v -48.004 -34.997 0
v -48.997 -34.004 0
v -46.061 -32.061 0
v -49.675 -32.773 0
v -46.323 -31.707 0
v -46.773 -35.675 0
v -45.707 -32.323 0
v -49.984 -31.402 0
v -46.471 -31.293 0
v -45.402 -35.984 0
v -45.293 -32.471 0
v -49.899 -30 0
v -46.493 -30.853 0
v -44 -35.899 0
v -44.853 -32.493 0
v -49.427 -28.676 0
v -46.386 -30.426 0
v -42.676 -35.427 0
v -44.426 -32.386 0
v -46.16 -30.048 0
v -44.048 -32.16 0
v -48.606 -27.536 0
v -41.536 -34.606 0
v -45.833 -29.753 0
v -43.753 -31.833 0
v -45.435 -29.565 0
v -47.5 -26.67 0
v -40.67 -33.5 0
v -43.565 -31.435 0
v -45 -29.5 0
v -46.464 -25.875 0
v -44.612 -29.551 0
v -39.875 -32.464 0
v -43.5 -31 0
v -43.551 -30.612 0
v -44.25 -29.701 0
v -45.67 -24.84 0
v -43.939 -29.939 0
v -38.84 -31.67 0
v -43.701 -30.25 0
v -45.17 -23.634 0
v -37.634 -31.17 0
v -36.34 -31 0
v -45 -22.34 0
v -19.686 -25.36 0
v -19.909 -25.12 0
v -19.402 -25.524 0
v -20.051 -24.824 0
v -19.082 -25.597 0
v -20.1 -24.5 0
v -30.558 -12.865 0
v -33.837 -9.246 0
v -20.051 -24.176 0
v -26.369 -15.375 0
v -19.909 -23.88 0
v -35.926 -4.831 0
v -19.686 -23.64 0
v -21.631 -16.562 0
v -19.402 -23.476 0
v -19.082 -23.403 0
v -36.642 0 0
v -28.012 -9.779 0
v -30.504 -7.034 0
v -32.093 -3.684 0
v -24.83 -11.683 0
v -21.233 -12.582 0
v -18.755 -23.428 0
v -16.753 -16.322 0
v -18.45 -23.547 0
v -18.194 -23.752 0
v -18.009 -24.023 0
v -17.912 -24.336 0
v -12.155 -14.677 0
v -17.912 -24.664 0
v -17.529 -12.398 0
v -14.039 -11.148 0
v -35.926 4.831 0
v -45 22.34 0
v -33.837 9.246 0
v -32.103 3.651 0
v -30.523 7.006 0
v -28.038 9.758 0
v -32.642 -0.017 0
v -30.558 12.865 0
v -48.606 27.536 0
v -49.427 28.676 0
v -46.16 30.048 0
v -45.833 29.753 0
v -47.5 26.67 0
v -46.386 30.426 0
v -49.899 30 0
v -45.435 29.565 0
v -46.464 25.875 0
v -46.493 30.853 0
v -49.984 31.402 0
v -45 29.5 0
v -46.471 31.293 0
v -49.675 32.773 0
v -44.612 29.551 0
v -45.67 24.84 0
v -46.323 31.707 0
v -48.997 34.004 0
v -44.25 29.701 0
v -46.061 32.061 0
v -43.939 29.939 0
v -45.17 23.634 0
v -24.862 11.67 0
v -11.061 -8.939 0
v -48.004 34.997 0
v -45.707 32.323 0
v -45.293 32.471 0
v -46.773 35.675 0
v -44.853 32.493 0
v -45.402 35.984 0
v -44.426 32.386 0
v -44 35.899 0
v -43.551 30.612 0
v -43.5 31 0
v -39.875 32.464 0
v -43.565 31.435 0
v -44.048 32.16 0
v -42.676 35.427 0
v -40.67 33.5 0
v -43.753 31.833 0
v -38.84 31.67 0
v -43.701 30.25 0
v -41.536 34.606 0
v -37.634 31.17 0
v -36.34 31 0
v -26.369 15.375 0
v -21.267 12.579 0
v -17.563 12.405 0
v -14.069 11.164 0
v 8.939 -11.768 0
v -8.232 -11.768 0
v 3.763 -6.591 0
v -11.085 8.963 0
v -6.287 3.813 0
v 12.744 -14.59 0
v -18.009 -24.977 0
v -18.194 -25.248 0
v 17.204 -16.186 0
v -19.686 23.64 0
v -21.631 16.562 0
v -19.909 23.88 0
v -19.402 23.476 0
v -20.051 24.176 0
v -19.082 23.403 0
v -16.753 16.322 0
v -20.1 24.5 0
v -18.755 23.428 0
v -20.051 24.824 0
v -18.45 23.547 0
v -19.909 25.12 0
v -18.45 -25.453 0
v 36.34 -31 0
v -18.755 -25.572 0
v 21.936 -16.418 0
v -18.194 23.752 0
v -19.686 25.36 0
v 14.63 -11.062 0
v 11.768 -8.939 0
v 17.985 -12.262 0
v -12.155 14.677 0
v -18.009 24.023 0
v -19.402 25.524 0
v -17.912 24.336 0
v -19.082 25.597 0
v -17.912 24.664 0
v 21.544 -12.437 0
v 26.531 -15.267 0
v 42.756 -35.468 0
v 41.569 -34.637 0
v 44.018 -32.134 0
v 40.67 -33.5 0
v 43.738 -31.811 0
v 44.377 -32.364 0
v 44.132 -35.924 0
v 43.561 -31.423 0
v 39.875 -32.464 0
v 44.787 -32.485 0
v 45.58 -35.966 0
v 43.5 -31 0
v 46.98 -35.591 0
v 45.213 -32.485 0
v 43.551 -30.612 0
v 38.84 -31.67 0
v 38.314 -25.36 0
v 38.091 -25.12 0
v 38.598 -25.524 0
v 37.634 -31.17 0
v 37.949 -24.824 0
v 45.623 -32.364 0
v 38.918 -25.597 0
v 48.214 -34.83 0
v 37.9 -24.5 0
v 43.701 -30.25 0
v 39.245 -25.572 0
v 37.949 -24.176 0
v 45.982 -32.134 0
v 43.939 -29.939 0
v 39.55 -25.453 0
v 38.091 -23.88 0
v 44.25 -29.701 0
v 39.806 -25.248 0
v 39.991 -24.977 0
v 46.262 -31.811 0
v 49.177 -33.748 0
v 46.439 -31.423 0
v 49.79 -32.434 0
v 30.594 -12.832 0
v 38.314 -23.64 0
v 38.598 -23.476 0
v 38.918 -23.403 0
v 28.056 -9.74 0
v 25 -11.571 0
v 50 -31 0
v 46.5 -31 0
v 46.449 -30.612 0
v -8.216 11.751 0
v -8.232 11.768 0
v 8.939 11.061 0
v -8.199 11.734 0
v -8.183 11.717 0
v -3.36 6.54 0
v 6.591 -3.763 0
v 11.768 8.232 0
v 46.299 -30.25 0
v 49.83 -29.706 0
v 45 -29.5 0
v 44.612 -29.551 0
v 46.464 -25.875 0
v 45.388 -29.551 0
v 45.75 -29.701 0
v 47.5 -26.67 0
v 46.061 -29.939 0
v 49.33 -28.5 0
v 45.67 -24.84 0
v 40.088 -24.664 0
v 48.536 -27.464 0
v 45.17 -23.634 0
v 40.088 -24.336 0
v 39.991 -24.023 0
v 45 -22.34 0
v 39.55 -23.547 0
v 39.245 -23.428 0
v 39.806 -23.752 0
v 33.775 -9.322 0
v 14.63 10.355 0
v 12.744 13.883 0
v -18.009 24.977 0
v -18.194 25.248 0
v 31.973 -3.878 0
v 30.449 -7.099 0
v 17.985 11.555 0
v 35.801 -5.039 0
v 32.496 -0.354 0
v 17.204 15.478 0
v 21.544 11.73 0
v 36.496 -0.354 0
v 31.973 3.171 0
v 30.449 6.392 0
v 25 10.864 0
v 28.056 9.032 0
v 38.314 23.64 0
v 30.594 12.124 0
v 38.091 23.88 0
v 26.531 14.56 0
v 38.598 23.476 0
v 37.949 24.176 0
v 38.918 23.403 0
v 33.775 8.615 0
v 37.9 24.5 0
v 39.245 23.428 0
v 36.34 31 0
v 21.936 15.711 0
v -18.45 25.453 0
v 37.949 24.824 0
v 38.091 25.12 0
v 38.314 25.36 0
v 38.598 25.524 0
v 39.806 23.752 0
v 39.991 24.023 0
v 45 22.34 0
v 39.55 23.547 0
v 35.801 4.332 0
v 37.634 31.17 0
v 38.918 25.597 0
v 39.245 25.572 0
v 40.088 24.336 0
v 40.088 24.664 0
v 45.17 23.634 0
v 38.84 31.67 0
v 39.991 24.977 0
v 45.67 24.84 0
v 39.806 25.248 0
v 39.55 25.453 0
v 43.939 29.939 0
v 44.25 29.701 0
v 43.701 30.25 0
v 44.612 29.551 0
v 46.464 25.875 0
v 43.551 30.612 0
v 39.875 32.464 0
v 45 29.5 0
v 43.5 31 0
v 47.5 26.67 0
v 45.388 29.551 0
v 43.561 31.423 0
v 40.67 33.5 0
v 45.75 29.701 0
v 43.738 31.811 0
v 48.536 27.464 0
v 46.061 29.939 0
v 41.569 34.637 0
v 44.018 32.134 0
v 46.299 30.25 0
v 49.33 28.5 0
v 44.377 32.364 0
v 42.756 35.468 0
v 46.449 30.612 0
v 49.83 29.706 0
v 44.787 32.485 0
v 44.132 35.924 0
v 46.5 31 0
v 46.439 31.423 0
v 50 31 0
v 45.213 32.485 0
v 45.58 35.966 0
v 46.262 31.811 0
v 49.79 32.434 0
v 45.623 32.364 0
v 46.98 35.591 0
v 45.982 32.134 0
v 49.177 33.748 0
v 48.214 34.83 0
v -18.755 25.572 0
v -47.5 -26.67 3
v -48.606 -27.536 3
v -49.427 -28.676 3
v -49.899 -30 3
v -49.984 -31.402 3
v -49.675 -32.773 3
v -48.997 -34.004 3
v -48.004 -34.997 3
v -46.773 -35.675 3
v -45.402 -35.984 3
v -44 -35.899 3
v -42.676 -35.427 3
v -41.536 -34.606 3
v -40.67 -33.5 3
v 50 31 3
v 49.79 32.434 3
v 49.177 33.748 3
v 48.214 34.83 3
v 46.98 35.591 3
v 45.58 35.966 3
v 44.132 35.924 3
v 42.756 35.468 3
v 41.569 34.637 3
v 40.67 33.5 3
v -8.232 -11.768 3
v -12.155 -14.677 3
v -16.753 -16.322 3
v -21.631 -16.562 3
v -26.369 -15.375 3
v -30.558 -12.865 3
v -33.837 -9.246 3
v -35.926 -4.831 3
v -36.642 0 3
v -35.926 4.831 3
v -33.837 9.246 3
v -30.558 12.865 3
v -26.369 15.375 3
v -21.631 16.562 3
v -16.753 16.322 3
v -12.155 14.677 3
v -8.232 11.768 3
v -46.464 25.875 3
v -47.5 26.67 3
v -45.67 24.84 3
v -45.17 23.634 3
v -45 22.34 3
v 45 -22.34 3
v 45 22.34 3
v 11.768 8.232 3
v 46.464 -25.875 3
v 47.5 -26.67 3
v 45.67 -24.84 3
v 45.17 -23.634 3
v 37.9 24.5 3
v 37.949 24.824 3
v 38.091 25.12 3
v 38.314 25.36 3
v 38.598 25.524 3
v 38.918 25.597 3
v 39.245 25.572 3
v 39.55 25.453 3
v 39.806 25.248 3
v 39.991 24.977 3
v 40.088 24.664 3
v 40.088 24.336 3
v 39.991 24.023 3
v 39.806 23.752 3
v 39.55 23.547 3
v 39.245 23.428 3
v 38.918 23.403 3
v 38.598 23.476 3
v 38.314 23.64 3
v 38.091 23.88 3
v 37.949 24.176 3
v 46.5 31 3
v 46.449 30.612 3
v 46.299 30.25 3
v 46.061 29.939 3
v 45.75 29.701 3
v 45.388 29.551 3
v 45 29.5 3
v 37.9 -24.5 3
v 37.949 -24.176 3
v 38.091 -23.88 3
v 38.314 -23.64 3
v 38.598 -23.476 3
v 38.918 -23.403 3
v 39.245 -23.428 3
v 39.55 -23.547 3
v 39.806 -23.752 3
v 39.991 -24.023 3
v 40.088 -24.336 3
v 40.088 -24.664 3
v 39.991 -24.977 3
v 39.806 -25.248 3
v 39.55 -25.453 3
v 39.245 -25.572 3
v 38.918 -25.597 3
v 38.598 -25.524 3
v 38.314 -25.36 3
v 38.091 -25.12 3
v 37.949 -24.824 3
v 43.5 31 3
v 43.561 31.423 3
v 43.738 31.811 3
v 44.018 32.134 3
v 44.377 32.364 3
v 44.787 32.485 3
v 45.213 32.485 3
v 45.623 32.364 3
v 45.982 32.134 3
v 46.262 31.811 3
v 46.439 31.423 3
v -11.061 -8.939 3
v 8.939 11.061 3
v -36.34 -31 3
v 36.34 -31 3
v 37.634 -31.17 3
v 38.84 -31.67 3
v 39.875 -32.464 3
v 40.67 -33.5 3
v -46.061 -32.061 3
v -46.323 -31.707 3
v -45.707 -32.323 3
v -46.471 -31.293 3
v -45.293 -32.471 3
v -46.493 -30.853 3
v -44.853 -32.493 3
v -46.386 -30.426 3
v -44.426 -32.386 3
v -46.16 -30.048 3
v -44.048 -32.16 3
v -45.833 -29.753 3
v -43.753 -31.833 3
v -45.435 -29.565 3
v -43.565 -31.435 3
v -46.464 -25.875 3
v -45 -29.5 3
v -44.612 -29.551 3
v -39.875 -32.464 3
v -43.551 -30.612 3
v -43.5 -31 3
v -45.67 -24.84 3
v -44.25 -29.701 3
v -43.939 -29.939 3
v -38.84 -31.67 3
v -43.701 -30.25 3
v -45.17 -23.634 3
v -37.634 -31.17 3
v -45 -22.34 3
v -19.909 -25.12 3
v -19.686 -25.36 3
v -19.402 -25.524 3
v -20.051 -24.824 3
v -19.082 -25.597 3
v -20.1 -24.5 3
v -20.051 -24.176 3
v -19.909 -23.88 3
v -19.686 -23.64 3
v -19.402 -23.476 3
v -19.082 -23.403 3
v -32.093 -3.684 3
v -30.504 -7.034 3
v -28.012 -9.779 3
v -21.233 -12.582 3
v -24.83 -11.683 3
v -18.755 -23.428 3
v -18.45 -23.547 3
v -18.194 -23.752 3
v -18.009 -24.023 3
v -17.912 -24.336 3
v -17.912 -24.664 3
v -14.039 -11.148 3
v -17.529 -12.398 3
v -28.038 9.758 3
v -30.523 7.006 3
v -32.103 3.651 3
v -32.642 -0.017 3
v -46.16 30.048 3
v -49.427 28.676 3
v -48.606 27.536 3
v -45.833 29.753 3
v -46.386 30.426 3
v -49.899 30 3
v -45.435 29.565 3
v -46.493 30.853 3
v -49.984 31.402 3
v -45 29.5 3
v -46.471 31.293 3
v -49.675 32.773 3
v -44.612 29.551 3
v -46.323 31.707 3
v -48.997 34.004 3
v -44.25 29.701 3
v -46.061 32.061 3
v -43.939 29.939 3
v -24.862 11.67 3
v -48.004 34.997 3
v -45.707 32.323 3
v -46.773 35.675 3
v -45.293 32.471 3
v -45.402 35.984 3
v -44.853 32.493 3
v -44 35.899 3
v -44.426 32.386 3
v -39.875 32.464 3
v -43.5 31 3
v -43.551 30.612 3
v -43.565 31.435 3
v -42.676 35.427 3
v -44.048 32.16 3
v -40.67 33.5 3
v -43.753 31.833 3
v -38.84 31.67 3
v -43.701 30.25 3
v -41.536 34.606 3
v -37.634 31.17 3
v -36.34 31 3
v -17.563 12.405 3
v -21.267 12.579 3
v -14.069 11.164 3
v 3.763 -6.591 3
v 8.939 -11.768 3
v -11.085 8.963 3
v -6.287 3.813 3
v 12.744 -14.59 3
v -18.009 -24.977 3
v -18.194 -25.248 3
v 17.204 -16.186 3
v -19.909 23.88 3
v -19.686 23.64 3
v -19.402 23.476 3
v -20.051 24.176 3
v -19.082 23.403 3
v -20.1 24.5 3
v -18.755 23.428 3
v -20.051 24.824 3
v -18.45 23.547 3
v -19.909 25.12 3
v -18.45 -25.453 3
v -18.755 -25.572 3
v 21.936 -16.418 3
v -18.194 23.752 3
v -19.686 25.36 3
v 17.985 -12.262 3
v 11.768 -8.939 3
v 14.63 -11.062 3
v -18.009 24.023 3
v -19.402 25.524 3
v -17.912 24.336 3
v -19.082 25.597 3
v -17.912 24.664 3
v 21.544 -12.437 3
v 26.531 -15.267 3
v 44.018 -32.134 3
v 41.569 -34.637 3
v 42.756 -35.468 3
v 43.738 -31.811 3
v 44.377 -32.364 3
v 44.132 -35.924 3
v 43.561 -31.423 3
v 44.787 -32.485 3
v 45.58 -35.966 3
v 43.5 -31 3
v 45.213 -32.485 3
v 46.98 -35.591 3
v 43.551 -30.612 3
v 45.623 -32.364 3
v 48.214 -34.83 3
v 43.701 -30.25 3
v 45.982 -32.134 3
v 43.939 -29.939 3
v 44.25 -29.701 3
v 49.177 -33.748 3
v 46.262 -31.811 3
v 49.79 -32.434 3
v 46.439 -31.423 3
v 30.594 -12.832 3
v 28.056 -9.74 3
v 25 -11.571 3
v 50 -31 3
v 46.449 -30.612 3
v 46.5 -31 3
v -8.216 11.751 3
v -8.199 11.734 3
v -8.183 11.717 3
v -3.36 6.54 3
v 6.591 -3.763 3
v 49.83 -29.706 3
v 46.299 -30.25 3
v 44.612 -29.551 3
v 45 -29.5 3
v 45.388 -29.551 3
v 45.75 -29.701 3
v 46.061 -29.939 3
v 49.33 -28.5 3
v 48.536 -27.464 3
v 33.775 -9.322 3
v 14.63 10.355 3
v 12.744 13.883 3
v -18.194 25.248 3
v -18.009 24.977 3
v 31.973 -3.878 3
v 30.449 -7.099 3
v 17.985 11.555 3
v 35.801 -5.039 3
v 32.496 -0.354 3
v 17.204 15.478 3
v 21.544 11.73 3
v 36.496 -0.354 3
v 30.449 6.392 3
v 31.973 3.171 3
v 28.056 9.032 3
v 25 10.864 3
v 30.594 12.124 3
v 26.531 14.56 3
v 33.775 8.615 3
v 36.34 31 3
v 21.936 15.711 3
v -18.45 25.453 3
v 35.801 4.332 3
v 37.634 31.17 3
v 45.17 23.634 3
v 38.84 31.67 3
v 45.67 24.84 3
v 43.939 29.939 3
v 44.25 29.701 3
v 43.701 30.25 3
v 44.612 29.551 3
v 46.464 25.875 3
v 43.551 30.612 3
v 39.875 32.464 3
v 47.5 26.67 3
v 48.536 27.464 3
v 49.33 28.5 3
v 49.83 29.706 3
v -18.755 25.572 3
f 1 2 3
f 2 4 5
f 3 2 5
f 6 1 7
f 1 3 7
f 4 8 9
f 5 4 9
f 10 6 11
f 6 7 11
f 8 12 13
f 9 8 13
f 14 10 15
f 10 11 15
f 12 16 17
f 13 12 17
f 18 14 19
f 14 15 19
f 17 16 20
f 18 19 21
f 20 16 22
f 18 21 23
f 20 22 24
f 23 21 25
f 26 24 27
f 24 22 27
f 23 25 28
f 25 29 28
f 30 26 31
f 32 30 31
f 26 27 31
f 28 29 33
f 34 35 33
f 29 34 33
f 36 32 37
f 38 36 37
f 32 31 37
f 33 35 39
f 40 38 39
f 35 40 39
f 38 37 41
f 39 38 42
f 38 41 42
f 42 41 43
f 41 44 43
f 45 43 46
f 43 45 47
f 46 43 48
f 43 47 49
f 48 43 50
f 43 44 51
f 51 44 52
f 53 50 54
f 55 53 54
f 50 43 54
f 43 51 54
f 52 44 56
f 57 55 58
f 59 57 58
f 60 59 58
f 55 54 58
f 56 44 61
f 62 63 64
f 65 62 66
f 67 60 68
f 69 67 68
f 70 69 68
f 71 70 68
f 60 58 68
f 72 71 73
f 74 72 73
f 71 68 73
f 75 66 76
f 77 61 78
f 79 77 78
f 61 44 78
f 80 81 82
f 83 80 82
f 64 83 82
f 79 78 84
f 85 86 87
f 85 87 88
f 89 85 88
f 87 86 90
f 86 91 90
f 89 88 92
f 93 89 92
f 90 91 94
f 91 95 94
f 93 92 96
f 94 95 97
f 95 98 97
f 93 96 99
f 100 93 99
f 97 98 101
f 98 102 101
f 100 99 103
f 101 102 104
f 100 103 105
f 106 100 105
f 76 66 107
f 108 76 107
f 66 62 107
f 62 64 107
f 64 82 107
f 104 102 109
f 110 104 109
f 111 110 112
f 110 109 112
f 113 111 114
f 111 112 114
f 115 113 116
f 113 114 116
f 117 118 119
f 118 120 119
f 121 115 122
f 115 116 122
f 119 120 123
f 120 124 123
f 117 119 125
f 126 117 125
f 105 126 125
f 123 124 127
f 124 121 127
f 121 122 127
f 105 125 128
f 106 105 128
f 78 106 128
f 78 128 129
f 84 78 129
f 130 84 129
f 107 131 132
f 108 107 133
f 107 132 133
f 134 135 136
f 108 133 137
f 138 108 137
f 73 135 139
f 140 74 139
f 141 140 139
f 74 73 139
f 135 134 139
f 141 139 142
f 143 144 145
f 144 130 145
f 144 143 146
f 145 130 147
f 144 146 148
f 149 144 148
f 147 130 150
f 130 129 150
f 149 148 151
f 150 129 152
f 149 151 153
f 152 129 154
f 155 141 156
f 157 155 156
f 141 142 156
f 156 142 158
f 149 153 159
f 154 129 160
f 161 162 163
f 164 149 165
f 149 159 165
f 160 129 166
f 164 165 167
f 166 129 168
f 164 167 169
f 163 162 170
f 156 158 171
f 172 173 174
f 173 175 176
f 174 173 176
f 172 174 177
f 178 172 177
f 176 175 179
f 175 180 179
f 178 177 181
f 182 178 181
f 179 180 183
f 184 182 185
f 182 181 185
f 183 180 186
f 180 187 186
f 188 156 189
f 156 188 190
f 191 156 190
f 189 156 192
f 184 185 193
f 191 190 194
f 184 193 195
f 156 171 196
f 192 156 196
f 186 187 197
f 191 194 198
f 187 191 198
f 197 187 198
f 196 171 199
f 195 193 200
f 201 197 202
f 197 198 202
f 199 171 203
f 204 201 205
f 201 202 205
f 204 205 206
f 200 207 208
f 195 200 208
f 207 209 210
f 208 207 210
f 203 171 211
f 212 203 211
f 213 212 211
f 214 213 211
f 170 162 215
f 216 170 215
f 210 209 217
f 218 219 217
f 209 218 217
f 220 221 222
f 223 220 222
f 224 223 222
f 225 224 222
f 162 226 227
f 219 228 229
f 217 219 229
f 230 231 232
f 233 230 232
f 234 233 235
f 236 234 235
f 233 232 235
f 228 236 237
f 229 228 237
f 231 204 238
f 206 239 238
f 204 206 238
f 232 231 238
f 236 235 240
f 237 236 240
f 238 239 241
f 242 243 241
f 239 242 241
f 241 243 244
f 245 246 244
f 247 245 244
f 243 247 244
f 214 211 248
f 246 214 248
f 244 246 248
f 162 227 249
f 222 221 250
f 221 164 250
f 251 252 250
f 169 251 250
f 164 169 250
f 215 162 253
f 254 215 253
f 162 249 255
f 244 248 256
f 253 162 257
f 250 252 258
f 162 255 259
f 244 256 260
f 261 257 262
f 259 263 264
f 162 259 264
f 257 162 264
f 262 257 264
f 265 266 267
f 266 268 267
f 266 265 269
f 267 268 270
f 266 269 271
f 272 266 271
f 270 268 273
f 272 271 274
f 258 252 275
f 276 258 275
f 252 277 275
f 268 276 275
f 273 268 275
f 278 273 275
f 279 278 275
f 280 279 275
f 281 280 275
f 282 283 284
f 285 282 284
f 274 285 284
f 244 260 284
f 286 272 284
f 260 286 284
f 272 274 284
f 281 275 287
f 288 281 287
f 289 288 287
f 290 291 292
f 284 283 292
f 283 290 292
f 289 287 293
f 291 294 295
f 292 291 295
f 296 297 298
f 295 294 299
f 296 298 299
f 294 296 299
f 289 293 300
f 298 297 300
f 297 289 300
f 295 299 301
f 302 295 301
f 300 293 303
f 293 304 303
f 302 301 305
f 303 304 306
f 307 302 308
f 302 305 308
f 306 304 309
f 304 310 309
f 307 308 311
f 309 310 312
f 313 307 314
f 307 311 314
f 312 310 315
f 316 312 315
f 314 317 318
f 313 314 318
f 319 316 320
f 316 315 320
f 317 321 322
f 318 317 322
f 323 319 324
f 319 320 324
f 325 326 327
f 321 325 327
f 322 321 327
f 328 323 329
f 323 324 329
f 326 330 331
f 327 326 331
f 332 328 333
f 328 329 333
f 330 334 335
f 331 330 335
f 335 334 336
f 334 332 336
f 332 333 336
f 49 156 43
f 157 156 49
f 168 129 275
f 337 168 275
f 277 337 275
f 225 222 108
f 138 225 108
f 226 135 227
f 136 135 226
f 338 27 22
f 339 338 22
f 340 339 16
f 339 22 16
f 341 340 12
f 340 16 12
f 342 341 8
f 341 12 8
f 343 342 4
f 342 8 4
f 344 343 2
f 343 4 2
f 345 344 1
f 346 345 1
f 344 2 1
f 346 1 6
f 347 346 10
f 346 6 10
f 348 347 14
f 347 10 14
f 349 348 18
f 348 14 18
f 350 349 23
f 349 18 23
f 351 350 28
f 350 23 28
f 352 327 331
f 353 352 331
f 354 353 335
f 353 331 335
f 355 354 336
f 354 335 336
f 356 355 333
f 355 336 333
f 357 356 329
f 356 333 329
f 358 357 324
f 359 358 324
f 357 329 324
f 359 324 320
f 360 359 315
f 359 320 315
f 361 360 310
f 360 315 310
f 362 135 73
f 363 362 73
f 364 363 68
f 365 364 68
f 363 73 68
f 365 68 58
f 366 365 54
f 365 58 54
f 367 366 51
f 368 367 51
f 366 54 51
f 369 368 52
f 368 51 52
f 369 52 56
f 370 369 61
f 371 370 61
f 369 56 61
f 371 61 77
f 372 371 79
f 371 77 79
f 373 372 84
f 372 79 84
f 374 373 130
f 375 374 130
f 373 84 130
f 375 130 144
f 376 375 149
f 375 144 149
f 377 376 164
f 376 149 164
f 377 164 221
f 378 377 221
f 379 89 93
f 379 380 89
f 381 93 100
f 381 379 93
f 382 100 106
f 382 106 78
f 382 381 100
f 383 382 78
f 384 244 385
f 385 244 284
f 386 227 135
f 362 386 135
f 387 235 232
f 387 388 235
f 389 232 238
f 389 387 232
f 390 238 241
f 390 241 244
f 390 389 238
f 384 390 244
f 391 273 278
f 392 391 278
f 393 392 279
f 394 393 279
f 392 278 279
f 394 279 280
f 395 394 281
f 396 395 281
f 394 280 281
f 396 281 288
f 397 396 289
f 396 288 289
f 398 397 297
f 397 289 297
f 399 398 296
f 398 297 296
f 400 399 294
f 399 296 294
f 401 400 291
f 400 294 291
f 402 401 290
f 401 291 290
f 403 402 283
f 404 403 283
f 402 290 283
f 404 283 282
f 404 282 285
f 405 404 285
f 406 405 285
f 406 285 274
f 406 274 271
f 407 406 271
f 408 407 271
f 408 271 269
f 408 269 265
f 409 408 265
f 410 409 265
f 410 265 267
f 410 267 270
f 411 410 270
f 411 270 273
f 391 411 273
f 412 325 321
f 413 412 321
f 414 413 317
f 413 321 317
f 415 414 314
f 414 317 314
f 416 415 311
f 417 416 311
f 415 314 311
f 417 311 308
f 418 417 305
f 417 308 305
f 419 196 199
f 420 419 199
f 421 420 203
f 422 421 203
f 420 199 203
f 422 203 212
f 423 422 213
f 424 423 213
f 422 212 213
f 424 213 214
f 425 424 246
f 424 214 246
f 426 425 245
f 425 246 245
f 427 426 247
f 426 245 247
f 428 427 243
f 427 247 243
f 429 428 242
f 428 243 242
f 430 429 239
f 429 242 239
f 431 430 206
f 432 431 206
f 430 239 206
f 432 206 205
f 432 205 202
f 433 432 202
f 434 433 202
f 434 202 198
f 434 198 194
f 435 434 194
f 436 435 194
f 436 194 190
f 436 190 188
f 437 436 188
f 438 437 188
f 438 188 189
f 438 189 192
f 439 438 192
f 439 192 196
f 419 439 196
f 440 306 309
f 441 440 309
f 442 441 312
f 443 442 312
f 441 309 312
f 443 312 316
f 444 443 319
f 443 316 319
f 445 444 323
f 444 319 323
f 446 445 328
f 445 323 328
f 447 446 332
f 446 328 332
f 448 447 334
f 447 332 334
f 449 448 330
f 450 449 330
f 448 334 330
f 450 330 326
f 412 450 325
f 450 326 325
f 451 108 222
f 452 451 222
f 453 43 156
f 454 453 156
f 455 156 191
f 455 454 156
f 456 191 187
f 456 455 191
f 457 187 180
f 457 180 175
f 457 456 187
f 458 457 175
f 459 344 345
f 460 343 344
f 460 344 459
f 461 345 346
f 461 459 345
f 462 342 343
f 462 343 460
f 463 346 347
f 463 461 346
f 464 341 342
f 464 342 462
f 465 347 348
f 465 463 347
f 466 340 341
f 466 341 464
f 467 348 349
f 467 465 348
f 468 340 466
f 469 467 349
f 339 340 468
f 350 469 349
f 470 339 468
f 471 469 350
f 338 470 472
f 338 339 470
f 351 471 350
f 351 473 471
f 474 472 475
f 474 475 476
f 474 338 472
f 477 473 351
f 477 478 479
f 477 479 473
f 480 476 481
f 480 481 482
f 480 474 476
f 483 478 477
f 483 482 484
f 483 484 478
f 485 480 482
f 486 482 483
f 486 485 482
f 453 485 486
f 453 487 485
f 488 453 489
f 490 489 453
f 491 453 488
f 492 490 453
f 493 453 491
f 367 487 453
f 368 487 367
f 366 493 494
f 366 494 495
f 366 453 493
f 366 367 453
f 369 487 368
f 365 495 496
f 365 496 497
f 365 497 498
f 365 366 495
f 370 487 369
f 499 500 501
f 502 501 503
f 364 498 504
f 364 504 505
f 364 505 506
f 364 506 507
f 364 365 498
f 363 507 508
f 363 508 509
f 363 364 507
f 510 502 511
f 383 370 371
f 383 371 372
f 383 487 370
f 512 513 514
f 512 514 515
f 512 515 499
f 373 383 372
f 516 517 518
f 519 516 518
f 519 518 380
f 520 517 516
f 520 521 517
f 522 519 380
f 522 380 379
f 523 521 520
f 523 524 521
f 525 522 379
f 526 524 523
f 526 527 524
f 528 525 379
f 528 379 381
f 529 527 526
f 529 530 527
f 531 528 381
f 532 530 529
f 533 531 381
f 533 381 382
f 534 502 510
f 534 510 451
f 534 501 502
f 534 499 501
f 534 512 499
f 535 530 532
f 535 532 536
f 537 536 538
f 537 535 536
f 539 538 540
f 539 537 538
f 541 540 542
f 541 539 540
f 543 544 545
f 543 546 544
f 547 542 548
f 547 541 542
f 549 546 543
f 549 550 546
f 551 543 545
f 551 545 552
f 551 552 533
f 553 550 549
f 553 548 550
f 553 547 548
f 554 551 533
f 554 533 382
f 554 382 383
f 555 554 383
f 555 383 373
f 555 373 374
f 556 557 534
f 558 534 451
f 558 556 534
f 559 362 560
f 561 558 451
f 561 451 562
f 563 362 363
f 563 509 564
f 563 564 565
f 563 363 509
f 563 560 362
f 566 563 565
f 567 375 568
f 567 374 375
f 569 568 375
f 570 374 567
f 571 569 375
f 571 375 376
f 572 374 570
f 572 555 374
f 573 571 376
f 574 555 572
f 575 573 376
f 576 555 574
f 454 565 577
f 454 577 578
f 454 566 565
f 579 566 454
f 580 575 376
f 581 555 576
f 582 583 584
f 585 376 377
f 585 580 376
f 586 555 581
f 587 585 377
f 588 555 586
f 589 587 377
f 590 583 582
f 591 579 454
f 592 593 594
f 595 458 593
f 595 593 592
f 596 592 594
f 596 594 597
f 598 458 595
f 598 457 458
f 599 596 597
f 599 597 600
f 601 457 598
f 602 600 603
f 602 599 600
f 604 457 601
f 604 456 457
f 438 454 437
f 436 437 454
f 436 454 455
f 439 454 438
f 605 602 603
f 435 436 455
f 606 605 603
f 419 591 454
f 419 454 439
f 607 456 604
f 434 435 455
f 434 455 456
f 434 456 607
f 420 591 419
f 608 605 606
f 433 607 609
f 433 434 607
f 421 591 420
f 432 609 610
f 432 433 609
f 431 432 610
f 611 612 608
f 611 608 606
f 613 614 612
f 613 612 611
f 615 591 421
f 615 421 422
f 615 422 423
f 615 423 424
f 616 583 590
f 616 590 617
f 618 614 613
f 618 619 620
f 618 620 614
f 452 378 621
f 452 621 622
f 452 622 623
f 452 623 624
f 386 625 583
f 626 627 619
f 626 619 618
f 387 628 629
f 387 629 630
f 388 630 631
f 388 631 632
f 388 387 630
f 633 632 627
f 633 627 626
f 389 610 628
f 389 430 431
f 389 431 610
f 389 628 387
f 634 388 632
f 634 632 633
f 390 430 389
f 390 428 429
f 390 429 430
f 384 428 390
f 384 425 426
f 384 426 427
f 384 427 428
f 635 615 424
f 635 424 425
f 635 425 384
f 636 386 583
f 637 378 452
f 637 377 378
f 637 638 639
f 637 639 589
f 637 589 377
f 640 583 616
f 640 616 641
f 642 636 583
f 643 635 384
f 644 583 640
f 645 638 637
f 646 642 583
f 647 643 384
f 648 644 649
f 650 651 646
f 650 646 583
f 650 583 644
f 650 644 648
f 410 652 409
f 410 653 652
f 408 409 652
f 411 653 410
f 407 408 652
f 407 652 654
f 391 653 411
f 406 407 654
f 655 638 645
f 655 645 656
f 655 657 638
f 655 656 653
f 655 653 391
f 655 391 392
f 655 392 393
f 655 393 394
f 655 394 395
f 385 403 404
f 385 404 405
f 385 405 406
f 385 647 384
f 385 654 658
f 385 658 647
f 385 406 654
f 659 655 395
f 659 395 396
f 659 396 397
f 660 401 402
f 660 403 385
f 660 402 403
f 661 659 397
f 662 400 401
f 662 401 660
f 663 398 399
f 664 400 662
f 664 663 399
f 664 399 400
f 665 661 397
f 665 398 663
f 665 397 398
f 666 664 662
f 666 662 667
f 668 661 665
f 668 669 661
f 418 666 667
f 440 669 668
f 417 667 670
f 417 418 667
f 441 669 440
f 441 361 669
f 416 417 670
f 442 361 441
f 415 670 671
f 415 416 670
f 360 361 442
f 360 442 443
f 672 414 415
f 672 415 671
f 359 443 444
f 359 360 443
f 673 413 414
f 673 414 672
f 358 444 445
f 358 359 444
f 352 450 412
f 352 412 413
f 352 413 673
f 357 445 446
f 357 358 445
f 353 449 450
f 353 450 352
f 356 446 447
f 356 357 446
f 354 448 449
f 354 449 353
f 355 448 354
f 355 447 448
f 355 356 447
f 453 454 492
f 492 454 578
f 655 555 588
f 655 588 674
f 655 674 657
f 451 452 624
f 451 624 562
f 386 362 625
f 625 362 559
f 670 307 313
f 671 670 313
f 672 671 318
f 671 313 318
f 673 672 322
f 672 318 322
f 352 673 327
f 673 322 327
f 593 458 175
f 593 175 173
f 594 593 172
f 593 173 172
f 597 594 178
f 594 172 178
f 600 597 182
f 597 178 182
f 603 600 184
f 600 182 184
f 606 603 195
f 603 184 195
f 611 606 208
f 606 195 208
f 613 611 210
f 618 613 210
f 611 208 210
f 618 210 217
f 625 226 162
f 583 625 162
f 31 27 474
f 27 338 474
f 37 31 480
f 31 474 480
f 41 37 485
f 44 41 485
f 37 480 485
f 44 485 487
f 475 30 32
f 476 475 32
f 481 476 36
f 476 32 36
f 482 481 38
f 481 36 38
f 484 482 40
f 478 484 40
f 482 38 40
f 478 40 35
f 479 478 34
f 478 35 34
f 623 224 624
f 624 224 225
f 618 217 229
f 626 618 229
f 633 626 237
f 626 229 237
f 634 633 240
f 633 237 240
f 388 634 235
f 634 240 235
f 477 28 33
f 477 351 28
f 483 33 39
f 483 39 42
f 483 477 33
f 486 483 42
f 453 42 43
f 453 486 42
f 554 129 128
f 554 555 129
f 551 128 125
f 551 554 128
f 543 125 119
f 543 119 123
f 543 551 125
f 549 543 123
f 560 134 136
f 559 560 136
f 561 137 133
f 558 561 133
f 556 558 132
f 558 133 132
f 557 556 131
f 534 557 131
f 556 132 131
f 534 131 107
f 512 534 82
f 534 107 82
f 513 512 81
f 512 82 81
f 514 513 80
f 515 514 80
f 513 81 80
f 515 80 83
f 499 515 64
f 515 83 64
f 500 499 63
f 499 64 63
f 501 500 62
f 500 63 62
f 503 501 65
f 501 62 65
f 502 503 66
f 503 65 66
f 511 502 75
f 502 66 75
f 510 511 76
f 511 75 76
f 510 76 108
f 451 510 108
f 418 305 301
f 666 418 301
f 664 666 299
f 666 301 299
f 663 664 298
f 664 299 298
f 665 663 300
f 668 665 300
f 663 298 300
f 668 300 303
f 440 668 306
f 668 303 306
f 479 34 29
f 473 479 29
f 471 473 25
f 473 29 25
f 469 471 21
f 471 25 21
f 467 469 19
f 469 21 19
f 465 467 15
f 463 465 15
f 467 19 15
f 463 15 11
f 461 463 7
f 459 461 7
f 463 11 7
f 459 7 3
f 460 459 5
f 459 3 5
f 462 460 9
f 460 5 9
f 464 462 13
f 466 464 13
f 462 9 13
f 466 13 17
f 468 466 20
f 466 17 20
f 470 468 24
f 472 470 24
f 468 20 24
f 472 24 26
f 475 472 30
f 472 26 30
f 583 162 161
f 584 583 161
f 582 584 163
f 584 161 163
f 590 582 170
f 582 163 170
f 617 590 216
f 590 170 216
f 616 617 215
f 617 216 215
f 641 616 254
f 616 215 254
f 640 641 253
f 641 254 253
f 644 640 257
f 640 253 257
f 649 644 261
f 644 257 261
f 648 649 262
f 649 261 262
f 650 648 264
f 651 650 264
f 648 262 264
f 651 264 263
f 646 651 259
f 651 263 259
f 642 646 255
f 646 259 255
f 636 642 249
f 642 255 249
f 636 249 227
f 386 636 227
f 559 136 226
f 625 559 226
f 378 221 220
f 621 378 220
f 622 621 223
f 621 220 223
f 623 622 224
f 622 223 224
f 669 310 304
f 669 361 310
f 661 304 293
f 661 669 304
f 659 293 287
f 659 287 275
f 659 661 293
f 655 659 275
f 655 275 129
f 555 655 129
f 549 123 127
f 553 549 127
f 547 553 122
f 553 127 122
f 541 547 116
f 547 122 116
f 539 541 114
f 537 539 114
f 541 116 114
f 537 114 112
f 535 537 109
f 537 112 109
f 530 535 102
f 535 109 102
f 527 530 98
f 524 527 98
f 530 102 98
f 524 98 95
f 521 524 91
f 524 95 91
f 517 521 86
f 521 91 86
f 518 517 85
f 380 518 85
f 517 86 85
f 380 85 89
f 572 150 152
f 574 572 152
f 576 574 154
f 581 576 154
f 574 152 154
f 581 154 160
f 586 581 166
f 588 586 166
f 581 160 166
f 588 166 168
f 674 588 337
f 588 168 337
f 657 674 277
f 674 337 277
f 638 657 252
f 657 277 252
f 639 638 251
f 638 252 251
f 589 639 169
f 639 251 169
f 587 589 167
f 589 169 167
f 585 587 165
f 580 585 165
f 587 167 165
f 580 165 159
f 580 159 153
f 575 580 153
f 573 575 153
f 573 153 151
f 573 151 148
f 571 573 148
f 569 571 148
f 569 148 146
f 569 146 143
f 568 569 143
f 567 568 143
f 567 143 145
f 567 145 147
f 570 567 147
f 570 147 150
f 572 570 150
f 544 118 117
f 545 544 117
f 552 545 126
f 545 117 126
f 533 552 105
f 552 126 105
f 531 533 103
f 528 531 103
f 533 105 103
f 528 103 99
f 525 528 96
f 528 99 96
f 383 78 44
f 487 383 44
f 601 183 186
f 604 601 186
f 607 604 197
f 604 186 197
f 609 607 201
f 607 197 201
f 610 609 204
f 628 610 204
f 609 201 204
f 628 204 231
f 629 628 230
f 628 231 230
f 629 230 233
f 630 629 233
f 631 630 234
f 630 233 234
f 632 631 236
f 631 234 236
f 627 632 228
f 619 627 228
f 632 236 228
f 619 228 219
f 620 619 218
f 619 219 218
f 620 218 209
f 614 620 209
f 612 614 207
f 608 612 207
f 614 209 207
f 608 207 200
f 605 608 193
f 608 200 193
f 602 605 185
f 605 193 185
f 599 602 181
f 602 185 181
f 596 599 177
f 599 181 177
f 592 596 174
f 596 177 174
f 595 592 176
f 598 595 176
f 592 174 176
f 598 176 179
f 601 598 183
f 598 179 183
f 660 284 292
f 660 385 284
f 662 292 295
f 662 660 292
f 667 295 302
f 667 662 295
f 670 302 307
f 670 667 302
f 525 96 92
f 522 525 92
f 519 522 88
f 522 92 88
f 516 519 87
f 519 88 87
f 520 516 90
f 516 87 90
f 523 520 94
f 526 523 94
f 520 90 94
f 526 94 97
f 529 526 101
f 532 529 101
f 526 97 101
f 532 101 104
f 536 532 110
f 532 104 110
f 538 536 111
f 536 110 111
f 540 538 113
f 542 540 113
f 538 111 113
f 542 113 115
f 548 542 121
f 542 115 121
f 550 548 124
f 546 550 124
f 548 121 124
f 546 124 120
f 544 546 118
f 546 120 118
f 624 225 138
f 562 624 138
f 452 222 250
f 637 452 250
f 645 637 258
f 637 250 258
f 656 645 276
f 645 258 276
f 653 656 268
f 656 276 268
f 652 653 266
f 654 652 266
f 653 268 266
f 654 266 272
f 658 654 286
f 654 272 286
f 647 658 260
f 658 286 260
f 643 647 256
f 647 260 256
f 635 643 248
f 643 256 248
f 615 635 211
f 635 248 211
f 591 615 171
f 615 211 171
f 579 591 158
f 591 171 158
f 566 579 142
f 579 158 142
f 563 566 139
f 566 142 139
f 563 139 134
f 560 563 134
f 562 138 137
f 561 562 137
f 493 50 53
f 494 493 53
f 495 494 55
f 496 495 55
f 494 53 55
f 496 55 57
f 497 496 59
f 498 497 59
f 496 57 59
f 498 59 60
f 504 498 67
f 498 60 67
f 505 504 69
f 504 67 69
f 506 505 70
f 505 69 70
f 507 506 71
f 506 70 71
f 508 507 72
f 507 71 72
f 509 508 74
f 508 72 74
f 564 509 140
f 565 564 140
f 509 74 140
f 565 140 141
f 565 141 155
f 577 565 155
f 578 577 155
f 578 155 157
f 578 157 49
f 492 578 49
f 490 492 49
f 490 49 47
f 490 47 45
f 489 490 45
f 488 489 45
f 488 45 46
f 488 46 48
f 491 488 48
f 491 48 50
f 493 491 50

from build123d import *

# Parameters (mm, degrees)
F1_DEPTH = 3
F2_R     = 5
F4_D     = 2.2


with BuildPart() as f1:
    # F0 (on Top) → F1 (new body)
    with BuildSketch(Plane.XY):
        with BuildLine():
            ThreePointArc((-45, -26), (-48.5355339059, -34.5355339059), (-40, -31))
            Line((-40, -31), (-43.5, -31))
            ThreePointArc((-43.5, -31), (-46.0606601718, -32.0606601718), (-45, -29.5))
            Line((-45, -29.5), (-45, -26))
        make_face()
        with BuildLine():
            ThreePointArc((-45, -26), (-41.4644660941, -27.4644660941), (-40, -31))
            Line((-40, -31), (40, -31))
            ThreePointArc((40, -31), (41.4644660941, -27.4644660941), (45, -26))
            Line((45, -26), (45, 26))
            ThreePointArc((45, 26), (41.4644660941, 27.4644660941), (40, 31))
            Line((40, 31), (-40, 31))
            ThreePointArc((-40, 31), (-41.4644660941, 27.4644660941), (-45, 26))
            Line((-45, 26), (-45, -26))
        make_face()
        with BuildLine():
            Line((-11.0606601718, -8.9393398282), (8.9393398282, 11.0606601718))
            ThreePointArc((8.9393398282, 11.0606601718), (36.4956890143, -0.3535533906), (8.9393398282, -11.767766953))
            Line((8.9393398282, -11.767766953), (3.7625631329, -6.5909902577))
            Line((3.7625631329, -6.5909902577), (5.1767766953, -5.1767766953))
            Line((5.1767766953, -5.1767766953), (6.5909902577, -3.7625631329))
            Line((6.5909902577, -3.7625631329), (11.767766953, -8.9393398282))
            ThreePointArc((11.767766953, -8.9393398282), (32.4956890143, -0.3535533906), (11.767766953, 8.232233047))
            Line((11.767766953, 8.232233047), (-8.232233047, -11.767766953))
            ThreePointArc((-8.232233047, -11.767766953), (-36.6421356237, 0), (-8.232233047, 11.767766953))
            ThreePointArc((-8.232233047, 11.767766953), (-8.2074655375, 11.7425578811), (-8.1831473235, 11.716915118))
            Line((-8.1831473235, 11.716915118), (-3.3599240188, 6.5401384227))
            Line((-3.3599240188, 6.5401384227), (-4.8232233047, 5.1767766953))
            Line((-4.8232233047, 5.1767766953), (-6.2865225906, 3.8134149679))
            Line((-6.2865225906, 3.8134149679), (-11.0847678218, 8.9633826393))
            ThreePointArc((-11.0847678218, 8.9633826393), (-32.6421241617, -0.0170237742), (-11.0606601718, -8.9393398282))
        make_face(mode=Mode.SUBTRACT)
        with BuildLine():
            Line((-43.5, -31), (-40, -31))
            ThreePointArc((-40, -31), (-41.4644660941, -27.4644660941), (-45, -26))
            Line((-45, -26), (-45, -29.5))
            ThreePointArc((-45, -29.5), (-43.9393398282, -29.9393398282), (-43.5, -31))
        make_face()
        with BuildLine():
            ThreePointArc((45, -26), (41.4644660941, -27.4644660941), (40, -31))
            Line((40, -31), (43.5, -31))
            ThreePointArc((43.5, -31), (43.9393398282, -29.9393398282), (45, -29.5))
            Line((45, -29.5), (45, -26))
        make_face()
        with BuildLine():
            Line((43.5, -31), (40, -31))
            ThreePointArc((40, -31), (45, -36), (50, -31))
            ThreePointArc((50, -31), (48.5355339059, -27.4644660941), (45, -26))
            Line((45, -26), (45, -29.5))
            ThreePointArc((45, -29.5), (46.0606601718, -29.9393398282), (46.5, -31))
            ThreePointArc((46.5, -31), (45, -32.5), (43.5, -31))
        make_face()
        with BuildLine():
            ThreePointArc((-40, 31), (-48.5355339059, 34.5355339059), (-45, 26))
            Line((-45, 26), (-45, 29.5))
            ThreePointArc((-45, 29.5), (-46.0606601718, 32.0606601718), (-43.5, 31))
            Line((-43.5, 31), (-40, 31))
        make_face()
        with BuildLine():
            Line((-45, 29.5), (-45, 26))
            ThreePointArc((-45, 26), (-41.4644660941, 27.4644660941), (-40, 31))
            Line((-40, 31), (-43.5, 31))
            ThreePointArc((-43.5, 31), (-43.9393398282, 29.9393398282), (-45, 29.5))
        make_face()
        with BuildLine():
            ThreePointArc((40, 31), (41.4644660941, 27.4644660941), (45, 26))
            Line((45, 26), (45, 29.5))
            ThreePointArc((45, 29.5), (43.9393398282, 29.9393398282), (43.5, 31))
            Line((43.5, 31), (40, 31))
        make_face()
        with BuildLine():
            Line((45, 29.5), (45, 26))
            ThreePointArc((45, 26), (48.5355339059, 27.4644660941), (50, 31))
            ThreePointArc((50, 31), (45, 36), (40, 31))
            Line((40, 31), (43.5, 31))
            ThreePointArc((43.5, 31), (45, 32.5), (46.5, 31))
            ThreePointArc((46.5, 31), (46.0606601718, 29.9393398282), (45, 29.5))
        make_face()
    extrude(amount=F1_DEPTH)

    # F2
    f2_edges = [f1.edges().sort_by_distance(p)[0] for p in [
        (-40, -31, 1.5),
        (45, 26, 1.5),
        (40, -31, 1.5),
        (-45, -26, 1.5),
        (-45, 26, 1.5),
        (-40, 31, 1.5),
        (40, 31, 1.5),
        (45, -26, 1.5),
    ]]
    fillet(f2_edges, radius=F2_R)

    # F4 (through all)
    with Locations(Plane.XY.offset(3)):
        with Locations((-19, 24.5), (39, 24.5), (39, -24.5), (-19, -24.5)):
            Hole(F4_D / 2)


solid = f1.part
